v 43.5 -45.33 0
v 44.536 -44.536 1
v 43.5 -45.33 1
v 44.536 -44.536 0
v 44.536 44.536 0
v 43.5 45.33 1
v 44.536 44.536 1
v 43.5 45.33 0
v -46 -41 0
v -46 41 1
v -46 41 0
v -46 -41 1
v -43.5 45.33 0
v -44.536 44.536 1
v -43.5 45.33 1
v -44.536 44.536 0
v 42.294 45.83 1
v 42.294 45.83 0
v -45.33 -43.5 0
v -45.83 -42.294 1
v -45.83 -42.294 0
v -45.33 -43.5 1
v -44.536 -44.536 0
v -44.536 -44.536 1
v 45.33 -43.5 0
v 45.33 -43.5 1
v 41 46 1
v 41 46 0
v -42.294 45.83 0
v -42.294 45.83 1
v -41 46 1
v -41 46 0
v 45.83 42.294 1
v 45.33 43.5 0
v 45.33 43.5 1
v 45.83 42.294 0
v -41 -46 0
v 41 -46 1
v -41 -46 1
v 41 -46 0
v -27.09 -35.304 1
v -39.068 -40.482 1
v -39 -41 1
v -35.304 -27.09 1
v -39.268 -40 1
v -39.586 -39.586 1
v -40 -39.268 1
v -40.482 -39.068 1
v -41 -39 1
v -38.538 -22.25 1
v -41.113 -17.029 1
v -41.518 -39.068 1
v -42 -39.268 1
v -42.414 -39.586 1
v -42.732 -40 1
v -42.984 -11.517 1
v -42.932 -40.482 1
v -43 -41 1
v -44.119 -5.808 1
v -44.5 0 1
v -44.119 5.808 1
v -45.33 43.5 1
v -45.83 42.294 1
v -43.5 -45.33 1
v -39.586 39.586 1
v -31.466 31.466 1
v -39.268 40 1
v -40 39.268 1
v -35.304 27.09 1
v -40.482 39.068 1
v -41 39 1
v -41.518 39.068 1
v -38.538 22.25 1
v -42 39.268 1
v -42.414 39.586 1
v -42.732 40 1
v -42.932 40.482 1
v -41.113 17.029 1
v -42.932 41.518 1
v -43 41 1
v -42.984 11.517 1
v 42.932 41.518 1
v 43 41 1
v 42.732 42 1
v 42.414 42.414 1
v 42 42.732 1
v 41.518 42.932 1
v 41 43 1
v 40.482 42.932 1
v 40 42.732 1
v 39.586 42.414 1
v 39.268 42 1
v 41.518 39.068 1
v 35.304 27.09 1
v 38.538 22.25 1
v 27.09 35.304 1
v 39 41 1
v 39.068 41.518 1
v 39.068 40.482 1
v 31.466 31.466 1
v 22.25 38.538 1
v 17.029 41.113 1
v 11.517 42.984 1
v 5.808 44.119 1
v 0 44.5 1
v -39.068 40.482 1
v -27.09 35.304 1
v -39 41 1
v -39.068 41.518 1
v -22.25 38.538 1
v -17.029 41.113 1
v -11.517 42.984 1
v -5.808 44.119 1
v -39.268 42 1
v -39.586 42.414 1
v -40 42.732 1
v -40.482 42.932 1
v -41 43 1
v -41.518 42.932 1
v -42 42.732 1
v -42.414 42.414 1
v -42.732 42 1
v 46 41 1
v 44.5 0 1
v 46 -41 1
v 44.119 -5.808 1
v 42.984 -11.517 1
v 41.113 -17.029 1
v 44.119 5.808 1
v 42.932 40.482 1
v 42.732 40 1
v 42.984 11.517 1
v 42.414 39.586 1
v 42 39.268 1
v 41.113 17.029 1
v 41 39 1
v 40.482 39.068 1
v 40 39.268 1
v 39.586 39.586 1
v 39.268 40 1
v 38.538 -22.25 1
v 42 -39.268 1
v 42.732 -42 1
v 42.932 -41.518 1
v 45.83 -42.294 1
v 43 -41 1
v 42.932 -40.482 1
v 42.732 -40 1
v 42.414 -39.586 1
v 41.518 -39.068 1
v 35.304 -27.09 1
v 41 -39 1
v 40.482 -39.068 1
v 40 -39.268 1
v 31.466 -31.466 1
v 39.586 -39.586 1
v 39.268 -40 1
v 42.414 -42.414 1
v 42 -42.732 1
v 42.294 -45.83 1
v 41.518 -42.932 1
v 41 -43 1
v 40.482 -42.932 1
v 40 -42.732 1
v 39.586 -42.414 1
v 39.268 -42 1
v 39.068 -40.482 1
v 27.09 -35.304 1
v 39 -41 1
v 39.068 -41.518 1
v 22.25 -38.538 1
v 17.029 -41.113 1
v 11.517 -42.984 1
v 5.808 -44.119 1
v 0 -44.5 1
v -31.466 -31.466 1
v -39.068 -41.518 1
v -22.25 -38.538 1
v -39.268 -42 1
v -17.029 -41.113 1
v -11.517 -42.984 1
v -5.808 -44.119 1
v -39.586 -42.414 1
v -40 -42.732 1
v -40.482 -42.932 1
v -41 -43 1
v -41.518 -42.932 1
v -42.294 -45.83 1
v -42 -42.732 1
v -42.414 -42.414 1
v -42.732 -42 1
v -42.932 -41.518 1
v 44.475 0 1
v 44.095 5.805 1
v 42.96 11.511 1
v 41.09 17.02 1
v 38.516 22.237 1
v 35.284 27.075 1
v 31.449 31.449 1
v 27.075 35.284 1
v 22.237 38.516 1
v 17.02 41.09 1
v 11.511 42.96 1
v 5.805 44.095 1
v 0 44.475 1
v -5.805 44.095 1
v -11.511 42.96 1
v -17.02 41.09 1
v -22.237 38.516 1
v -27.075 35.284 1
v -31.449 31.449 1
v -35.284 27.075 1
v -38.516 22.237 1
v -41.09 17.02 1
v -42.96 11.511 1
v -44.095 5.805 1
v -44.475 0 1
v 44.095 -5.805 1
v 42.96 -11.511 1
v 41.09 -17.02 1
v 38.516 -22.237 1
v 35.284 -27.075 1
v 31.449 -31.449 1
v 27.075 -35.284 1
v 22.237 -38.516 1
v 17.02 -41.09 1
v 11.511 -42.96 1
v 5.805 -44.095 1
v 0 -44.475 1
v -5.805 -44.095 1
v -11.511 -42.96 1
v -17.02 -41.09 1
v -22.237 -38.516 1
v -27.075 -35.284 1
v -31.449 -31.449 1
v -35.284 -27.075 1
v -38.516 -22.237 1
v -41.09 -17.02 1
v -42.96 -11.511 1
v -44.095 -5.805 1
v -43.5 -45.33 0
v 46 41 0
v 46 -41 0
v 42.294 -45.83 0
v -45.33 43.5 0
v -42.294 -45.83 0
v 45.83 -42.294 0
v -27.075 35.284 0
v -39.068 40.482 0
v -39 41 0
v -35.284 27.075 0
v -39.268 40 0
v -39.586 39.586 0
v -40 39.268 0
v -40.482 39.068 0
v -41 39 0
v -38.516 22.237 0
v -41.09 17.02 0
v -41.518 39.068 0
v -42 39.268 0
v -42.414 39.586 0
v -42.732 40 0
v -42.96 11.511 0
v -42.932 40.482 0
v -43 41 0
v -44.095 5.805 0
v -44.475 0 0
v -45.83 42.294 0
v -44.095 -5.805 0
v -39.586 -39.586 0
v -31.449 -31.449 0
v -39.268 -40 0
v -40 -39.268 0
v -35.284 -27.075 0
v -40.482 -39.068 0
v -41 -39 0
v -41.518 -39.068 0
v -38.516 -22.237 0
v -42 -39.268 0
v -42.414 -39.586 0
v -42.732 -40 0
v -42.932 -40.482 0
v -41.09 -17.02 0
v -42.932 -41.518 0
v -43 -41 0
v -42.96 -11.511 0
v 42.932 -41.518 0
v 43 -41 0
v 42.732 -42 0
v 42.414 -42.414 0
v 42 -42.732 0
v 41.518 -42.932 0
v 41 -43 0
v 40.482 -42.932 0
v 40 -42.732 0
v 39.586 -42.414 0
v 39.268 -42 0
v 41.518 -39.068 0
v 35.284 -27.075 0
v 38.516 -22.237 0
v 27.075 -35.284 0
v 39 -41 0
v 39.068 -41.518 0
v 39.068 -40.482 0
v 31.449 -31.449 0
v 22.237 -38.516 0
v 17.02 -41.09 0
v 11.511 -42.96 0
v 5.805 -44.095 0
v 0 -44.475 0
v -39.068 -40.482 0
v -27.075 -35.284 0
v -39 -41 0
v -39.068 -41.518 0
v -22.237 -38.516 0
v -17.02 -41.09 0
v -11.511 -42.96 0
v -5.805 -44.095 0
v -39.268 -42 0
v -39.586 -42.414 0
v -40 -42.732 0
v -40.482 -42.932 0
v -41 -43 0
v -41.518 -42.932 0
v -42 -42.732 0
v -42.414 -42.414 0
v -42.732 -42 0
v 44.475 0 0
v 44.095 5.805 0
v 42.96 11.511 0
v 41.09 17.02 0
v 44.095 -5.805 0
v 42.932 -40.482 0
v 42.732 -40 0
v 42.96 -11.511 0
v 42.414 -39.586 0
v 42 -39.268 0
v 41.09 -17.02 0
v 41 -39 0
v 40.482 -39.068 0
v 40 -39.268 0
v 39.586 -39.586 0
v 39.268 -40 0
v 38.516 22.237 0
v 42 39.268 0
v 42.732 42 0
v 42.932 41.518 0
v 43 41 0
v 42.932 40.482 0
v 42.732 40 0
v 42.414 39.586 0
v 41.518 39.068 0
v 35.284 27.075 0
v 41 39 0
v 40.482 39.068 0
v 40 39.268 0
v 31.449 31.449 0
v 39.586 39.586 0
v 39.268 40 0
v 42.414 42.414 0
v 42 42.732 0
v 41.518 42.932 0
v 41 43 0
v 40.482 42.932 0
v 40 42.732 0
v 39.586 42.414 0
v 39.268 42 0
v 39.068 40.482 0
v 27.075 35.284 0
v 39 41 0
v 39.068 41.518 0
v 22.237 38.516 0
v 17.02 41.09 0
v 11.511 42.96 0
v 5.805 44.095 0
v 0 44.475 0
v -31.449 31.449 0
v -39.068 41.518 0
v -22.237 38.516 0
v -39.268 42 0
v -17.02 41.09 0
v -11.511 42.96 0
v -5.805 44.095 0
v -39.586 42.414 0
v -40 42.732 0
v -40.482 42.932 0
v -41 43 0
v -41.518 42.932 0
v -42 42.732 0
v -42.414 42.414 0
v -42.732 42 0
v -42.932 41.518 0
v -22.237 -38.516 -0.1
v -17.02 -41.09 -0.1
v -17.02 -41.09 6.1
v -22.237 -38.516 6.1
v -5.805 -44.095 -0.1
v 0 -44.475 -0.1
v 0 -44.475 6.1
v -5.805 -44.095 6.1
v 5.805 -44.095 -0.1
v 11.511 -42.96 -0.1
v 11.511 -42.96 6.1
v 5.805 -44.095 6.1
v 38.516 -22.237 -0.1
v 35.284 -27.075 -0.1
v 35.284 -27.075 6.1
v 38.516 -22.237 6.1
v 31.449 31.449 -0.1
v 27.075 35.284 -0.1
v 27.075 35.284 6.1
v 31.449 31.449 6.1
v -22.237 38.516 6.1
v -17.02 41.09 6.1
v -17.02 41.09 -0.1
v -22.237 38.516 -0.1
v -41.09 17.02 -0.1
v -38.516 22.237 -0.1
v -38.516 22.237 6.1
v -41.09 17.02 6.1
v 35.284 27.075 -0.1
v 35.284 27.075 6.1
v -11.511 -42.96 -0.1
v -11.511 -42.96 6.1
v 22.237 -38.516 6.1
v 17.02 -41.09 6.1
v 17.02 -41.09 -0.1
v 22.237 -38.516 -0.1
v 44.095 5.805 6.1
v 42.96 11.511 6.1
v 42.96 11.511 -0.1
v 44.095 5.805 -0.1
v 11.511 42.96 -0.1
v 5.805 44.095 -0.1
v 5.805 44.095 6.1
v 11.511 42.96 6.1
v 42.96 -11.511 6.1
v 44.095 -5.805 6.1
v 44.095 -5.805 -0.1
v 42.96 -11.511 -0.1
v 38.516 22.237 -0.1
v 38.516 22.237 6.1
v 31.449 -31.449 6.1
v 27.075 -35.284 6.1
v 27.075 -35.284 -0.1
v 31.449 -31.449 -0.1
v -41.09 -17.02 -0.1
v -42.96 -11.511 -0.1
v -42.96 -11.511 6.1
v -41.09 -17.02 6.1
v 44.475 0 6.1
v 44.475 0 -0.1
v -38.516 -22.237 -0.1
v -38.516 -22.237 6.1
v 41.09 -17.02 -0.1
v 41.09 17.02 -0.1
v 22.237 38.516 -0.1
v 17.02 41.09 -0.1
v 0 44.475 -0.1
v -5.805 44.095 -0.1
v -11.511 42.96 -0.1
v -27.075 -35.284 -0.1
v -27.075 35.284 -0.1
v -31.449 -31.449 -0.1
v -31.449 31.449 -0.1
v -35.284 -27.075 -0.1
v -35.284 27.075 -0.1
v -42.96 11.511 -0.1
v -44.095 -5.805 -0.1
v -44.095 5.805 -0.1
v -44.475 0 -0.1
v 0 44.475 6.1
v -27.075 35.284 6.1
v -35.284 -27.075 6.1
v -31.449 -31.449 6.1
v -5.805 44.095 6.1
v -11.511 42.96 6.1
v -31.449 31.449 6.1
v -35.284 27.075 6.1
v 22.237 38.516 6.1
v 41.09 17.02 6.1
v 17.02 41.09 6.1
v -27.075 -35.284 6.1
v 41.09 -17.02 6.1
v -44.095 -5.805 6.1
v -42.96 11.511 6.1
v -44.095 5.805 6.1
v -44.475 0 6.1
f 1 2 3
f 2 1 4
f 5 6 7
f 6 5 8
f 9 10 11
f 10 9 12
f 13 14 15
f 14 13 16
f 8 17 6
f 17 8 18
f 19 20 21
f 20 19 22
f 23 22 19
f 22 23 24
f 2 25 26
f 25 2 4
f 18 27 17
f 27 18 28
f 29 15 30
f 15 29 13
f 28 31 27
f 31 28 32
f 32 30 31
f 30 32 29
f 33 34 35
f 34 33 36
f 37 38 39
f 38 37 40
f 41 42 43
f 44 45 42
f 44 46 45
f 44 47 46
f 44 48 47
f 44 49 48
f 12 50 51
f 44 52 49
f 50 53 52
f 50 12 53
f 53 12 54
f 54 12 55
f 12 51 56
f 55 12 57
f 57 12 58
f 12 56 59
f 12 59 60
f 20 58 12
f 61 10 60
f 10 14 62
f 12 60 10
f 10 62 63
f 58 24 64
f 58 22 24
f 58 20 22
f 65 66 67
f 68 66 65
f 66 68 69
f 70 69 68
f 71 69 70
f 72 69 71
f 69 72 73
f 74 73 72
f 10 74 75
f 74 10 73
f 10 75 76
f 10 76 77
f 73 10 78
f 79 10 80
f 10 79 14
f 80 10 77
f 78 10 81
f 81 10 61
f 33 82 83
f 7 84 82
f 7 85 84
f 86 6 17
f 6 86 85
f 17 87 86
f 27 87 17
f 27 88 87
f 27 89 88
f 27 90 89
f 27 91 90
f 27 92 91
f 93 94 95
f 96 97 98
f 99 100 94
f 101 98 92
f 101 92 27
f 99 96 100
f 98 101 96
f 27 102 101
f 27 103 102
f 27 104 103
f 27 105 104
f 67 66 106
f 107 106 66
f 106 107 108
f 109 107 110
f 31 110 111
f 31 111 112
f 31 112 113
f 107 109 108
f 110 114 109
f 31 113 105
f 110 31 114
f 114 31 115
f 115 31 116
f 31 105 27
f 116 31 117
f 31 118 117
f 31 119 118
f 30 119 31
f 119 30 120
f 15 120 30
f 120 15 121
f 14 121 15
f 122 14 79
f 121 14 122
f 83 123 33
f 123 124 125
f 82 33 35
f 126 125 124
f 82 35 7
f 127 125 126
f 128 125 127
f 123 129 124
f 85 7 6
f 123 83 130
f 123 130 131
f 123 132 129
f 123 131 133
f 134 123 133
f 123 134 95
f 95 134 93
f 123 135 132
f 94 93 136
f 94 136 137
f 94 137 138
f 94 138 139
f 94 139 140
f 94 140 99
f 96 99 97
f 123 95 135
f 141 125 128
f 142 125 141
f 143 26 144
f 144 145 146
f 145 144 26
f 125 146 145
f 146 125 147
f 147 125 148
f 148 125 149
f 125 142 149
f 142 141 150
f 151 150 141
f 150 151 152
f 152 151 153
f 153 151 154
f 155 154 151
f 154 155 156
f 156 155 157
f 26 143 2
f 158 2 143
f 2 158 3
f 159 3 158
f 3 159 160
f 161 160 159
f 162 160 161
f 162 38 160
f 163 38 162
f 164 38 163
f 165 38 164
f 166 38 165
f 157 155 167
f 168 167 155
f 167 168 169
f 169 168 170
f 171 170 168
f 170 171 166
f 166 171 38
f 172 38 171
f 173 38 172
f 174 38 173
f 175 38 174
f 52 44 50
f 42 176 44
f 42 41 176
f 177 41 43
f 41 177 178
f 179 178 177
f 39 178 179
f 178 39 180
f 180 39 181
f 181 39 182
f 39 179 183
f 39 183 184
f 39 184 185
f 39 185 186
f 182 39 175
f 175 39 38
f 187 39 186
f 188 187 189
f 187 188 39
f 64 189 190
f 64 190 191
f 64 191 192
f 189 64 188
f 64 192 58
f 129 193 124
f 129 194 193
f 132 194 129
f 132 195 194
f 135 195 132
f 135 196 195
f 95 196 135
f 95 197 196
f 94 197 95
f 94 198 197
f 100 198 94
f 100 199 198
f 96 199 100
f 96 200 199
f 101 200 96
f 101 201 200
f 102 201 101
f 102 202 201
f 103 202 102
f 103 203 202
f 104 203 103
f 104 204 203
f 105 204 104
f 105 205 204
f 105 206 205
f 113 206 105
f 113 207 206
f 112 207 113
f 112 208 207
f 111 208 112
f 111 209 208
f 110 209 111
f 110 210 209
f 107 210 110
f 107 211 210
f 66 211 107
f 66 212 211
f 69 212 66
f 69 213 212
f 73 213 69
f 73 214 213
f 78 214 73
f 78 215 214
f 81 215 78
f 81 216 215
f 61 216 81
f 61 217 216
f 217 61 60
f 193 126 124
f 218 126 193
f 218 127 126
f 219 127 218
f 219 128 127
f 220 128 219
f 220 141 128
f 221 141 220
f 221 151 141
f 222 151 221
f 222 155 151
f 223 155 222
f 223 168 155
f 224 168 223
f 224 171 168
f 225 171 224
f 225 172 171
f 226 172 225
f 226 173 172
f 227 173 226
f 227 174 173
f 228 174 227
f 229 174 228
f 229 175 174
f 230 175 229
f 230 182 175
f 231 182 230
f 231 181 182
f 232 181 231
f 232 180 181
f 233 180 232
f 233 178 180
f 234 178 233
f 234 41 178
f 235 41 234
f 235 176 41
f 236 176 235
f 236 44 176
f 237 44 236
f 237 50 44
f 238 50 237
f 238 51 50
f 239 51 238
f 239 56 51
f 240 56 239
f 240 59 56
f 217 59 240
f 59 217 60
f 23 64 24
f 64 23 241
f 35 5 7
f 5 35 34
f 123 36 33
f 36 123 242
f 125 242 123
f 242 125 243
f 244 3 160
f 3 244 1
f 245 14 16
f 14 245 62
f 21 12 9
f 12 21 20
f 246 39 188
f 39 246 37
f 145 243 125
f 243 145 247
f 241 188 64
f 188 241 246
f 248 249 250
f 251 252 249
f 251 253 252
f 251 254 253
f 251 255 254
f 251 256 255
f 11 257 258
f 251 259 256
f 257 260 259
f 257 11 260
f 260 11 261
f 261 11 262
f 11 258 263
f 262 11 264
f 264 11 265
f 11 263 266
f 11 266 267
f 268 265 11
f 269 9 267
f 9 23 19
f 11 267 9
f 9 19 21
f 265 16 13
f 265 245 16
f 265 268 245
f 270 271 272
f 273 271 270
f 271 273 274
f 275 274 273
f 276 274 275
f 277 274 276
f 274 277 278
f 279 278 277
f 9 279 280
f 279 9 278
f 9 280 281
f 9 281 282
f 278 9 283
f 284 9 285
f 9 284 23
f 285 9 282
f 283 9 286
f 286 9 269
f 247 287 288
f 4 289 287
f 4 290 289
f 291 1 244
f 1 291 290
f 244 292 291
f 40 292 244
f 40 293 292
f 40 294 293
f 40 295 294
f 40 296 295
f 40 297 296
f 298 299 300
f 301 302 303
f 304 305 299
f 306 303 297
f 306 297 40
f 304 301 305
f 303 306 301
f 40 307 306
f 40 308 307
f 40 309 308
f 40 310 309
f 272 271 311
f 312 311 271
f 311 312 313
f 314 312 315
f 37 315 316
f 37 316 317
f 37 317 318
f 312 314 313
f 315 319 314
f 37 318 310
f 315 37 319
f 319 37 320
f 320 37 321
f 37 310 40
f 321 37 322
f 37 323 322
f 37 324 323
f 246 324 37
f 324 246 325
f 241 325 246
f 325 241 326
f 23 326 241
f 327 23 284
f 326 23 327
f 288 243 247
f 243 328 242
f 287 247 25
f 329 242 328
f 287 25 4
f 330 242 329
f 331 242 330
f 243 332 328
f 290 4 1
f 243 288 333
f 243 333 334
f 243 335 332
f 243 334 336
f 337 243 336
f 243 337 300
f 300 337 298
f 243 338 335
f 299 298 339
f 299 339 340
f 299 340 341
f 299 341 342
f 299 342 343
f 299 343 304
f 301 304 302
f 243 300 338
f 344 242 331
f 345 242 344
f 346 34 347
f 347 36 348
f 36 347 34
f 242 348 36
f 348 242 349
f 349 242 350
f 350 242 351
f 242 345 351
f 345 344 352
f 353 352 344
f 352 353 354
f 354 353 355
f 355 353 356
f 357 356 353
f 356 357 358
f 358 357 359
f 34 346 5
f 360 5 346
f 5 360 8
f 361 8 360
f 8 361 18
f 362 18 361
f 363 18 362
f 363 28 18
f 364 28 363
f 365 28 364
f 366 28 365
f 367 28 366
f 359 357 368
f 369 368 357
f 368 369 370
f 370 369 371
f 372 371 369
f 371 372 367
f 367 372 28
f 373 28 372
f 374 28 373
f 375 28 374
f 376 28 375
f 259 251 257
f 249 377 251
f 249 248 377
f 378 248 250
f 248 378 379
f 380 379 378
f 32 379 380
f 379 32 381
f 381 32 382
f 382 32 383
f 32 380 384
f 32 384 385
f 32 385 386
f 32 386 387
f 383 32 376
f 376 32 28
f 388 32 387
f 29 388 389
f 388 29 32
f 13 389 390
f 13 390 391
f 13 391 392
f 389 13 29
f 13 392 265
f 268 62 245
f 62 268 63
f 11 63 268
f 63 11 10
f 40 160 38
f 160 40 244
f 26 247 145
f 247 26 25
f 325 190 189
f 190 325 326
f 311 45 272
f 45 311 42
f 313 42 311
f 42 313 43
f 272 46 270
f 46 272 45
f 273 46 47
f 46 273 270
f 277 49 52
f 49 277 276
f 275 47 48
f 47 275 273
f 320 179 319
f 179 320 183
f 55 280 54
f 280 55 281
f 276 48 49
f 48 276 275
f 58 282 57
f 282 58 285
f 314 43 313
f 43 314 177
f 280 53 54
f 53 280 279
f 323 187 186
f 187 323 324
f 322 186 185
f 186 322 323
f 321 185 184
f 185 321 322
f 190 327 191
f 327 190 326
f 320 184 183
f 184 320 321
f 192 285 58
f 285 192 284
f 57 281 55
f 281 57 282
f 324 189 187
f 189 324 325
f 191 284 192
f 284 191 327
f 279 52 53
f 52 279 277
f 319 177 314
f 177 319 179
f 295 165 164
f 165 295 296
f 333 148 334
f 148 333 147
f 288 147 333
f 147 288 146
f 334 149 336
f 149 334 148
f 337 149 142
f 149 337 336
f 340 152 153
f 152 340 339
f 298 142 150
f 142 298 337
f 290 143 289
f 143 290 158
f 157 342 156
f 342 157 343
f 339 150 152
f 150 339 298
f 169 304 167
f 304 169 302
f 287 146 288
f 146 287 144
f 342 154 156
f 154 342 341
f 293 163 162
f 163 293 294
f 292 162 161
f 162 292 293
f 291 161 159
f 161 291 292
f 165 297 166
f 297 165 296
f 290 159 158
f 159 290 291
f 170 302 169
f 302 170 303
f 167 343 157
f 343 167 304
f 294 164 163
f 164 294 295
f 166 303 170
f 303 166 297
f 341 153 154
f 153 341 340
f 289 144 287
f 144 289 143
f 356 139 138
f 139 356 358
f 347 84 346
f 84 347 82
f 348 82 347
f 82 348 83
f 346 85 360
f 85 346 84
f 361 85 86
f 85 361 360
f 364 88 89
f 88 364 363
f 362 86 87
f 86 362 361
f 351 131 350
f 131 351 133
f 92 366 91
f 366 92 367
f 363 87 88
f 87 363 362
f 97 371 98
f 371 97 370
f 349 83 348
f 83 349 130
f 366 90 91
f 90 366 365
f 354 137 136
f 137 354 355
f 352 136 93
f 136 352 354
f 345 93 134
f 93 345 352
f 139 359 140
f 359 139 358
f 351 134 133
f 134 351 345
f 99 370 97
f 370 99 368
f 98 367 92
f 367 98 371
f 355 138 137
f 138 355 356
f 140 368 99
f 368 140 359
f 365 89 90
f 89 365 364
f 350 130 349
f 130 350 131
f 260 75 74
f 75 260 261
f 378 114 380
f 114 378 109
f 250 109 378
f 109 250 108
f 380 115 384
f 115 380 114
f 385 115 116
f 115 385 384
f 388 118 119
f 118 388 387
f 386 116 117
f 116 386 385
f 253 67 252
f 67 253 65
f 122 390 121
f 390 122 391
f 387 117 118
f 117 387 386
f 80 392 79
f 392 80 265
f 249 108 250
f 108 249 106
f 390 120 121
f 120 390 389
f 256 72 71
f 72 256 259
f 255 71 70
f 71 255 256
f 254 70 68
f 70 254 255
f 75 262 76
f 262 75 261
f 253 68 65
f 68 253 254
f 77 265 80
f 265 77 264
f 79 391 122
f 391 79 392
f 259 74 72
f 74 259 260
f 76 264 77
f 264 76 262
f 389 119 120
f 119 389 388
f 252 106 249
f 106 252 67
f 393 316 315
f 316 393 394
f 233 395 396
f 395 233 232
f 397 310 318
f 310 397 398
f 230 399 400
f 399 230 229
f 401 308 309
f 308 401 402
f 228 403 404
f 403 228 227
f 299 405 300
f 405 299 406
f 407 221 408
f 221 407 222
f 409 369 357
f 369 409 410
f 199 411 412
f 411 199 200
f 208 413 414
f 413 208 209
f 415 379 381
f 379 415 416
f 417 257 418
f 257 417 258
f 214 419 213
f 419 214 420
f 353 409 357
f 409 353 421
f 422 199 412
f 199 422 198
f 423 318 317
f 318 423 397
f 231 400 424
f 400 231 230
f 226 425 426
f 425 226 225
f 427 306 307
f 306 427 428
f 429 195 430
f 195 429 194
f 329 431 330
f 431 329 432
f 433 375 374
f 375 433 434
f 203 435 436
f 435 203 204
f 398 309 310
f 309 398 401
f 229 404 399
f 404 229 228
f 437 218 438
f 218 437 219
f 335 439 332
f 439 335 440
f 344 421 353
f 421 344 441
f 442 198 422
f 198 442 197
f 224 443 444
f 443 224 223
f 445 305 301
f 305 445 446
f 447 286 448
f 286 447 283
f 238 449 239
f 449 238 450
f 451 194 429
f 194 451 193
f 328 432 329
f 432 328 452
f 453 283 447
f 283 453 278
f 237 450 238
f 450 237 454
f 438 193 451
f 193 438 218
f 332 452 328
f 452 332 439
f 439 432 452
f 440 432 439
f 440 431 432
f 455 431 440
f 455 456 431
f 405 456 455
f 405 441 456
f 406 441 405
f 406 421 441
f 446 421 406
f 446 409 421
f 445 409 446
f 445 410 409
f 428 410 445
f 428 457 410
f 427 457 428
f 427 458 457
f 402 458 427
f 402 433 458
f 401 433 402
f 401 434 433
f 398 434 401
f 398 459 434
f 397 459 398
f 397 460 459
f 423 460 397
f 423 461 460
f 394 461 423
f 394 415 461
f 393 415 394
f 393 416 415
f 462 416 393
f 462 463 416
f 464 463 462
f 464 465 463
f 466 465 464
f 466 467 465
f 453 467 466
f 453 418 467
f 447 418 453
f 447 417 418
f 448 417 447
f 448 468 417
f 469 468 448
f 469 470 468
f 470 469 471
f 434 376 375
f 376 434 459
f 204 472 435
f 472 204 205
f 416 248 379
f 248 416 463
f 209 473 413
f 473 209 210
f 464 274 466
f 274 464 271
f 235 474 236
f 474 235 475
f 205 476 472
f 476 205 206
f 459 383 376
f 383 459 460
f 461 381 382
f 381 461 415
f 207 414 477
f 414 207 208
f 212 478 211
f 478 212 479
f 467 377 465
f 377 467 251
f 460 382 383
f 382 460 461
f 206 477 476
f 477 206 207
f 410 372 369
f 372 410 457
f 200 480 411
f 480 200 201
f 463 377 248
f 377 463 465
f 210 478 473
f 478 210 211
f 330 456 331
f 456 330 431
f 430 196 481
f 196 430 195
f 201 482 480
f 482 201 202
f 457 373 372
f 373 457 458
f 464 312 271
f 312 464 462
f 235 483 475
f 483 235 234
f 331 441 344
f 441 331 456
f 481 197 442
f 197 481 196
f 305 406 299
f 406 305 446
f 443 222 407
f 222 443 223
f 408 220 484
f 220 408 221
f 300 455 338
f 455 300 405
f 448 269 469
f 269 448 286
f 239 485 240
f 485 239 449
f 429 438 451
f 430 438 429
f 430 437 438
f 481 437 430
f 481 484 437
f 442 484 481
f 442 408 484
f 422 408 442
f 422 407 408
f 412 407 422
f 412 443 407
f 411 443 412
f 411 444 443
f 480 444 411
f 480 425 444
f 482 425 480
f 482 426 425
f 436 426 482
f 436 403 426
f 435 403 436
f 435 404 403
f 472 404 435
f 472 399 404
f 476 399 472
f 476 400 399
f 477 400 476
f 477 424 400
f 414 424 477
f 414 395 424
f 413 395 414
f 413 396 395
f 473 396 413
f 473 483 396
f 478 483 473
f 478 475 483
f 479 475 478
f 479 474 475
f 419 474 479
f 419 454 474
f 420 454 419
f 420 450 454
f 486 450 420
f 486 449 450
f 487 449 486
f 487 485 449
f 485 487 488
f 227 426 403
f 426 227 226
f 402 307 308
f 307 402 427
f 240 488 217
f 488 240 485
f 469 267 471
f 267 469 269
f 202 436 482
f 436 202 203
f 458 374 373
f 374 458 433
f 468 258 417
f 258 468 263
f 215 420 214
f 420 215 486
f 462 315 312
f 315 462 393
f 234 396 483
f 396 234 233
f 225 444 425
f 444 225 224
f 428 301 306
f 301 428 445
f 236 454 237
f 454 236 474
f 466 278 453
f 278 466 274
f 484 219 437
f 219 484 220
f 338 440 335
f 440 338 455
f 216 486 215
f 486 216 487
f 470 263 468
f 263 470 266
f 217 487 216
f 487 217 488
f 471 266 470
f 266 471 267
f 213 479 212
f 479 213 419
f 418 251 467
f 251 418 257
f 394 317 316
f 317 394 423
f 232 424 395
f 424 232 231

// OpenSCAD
// file: ../OpenSCAD_Modules/boards.scad
module board(
	size_x=50,
	size_y=50,
	width=1.5,
	hole_diam=3,
	rounding=1,
	hole1=[3,3],
	hole2=[3,3],
	hole3=[3,3],
	hole4=[3,3],
	center_xy=false,
	center_z=false,
	board_color=[0.3,0.5,0.3],
	quality=2, //integer from 1 to infinity
)
{
	assert(size_x>0);
	assert(size_y>0);
	assert(width>0);
	assert(hole_diam>0);
	assert(rounding>0);
	assert(rounding<=size_x/2);
	assert(rounding<=size_y/2);
	assert(quality>0)

	color(board_color)
		translate([center_xy?-size_x/2:0,center_xy?-size_y/2:0,center_z?-width/2:0])
			difference()
			{
				//base
				translate([rounding,rounding])
					resize([size_x,size_y,width])
						minkowski()
						{
							cube([size_x-rounding*2,size_y-rounding*2,width]);
							cylinder(r=rounding,h=width,$fn=12*quality);
						};
				//holes
				if(hole1!=false && len(hole1)==2)
					translate([hole1[0],hole1[1],-width/2])
						cylinder(r=hole_diam/2,h=width*2,$fn=12*quality);
				if(hole2!=false && len(hole2)==2)
					translate([size_x-hole2[0],hole2[1],-width/2])
						cylinder(r=hole_diam/2,h=width*2,$fn=12*quality);
				if(hole3!=false && len(hole3)==2)
					translate([size_x-hole3[0],size_y-hole3[1],-width/2])
						cylinder(r=hole_diam/2,h=width*2,$fn=12*quality);
				if(hole4!=false && len(hole4)==2)
					translate([hole4[0],size_y-hole4[1],-width/2])
						cylinder(r=hole_diam/2,h=width*2,$fn=12*quality);
			}
}

//example
board(size_x=30,size_y=80,hole1=[15,3],hole2=false,center_xy=true,center_z=true,rounding=3);
// main file
use <../OpenSCAD_Modules/boards.scad>

module fan_cover(
	size=92,
	fan_diam=89,
	hole_diam=4,
	hole_shift=5,
	base=1,
	height=1,
	quality=2, //integer from 1 to infinity
)
{
	difference()
	{
		board(size_x=size,size_y=size,hole_diam=hole_diam,hole1=[hole_shift,hole_shift],hole2=[hole_shift,hole_shift],hole3=[hole_shift,hole_shift],hole4=[hole_shift,hole_shift],rounding=hole_shift,width=height,center_xy=true,center_z=false);
		translate([0,0,base])
			cylinder(d=fan_diam,h=height-base+0.1,$fn=24*quality);
	}
}

module fan_cut(
	fan_diam=89,
	height=6,
	quality=2, //integer from 1 to infinity
)
{
	translate([0,0,-0.1])
		cylinder(d=fan_diam-0.05,h=height+0.2,$fn=24*quality);
}

fan_cover();
fan_cut();
